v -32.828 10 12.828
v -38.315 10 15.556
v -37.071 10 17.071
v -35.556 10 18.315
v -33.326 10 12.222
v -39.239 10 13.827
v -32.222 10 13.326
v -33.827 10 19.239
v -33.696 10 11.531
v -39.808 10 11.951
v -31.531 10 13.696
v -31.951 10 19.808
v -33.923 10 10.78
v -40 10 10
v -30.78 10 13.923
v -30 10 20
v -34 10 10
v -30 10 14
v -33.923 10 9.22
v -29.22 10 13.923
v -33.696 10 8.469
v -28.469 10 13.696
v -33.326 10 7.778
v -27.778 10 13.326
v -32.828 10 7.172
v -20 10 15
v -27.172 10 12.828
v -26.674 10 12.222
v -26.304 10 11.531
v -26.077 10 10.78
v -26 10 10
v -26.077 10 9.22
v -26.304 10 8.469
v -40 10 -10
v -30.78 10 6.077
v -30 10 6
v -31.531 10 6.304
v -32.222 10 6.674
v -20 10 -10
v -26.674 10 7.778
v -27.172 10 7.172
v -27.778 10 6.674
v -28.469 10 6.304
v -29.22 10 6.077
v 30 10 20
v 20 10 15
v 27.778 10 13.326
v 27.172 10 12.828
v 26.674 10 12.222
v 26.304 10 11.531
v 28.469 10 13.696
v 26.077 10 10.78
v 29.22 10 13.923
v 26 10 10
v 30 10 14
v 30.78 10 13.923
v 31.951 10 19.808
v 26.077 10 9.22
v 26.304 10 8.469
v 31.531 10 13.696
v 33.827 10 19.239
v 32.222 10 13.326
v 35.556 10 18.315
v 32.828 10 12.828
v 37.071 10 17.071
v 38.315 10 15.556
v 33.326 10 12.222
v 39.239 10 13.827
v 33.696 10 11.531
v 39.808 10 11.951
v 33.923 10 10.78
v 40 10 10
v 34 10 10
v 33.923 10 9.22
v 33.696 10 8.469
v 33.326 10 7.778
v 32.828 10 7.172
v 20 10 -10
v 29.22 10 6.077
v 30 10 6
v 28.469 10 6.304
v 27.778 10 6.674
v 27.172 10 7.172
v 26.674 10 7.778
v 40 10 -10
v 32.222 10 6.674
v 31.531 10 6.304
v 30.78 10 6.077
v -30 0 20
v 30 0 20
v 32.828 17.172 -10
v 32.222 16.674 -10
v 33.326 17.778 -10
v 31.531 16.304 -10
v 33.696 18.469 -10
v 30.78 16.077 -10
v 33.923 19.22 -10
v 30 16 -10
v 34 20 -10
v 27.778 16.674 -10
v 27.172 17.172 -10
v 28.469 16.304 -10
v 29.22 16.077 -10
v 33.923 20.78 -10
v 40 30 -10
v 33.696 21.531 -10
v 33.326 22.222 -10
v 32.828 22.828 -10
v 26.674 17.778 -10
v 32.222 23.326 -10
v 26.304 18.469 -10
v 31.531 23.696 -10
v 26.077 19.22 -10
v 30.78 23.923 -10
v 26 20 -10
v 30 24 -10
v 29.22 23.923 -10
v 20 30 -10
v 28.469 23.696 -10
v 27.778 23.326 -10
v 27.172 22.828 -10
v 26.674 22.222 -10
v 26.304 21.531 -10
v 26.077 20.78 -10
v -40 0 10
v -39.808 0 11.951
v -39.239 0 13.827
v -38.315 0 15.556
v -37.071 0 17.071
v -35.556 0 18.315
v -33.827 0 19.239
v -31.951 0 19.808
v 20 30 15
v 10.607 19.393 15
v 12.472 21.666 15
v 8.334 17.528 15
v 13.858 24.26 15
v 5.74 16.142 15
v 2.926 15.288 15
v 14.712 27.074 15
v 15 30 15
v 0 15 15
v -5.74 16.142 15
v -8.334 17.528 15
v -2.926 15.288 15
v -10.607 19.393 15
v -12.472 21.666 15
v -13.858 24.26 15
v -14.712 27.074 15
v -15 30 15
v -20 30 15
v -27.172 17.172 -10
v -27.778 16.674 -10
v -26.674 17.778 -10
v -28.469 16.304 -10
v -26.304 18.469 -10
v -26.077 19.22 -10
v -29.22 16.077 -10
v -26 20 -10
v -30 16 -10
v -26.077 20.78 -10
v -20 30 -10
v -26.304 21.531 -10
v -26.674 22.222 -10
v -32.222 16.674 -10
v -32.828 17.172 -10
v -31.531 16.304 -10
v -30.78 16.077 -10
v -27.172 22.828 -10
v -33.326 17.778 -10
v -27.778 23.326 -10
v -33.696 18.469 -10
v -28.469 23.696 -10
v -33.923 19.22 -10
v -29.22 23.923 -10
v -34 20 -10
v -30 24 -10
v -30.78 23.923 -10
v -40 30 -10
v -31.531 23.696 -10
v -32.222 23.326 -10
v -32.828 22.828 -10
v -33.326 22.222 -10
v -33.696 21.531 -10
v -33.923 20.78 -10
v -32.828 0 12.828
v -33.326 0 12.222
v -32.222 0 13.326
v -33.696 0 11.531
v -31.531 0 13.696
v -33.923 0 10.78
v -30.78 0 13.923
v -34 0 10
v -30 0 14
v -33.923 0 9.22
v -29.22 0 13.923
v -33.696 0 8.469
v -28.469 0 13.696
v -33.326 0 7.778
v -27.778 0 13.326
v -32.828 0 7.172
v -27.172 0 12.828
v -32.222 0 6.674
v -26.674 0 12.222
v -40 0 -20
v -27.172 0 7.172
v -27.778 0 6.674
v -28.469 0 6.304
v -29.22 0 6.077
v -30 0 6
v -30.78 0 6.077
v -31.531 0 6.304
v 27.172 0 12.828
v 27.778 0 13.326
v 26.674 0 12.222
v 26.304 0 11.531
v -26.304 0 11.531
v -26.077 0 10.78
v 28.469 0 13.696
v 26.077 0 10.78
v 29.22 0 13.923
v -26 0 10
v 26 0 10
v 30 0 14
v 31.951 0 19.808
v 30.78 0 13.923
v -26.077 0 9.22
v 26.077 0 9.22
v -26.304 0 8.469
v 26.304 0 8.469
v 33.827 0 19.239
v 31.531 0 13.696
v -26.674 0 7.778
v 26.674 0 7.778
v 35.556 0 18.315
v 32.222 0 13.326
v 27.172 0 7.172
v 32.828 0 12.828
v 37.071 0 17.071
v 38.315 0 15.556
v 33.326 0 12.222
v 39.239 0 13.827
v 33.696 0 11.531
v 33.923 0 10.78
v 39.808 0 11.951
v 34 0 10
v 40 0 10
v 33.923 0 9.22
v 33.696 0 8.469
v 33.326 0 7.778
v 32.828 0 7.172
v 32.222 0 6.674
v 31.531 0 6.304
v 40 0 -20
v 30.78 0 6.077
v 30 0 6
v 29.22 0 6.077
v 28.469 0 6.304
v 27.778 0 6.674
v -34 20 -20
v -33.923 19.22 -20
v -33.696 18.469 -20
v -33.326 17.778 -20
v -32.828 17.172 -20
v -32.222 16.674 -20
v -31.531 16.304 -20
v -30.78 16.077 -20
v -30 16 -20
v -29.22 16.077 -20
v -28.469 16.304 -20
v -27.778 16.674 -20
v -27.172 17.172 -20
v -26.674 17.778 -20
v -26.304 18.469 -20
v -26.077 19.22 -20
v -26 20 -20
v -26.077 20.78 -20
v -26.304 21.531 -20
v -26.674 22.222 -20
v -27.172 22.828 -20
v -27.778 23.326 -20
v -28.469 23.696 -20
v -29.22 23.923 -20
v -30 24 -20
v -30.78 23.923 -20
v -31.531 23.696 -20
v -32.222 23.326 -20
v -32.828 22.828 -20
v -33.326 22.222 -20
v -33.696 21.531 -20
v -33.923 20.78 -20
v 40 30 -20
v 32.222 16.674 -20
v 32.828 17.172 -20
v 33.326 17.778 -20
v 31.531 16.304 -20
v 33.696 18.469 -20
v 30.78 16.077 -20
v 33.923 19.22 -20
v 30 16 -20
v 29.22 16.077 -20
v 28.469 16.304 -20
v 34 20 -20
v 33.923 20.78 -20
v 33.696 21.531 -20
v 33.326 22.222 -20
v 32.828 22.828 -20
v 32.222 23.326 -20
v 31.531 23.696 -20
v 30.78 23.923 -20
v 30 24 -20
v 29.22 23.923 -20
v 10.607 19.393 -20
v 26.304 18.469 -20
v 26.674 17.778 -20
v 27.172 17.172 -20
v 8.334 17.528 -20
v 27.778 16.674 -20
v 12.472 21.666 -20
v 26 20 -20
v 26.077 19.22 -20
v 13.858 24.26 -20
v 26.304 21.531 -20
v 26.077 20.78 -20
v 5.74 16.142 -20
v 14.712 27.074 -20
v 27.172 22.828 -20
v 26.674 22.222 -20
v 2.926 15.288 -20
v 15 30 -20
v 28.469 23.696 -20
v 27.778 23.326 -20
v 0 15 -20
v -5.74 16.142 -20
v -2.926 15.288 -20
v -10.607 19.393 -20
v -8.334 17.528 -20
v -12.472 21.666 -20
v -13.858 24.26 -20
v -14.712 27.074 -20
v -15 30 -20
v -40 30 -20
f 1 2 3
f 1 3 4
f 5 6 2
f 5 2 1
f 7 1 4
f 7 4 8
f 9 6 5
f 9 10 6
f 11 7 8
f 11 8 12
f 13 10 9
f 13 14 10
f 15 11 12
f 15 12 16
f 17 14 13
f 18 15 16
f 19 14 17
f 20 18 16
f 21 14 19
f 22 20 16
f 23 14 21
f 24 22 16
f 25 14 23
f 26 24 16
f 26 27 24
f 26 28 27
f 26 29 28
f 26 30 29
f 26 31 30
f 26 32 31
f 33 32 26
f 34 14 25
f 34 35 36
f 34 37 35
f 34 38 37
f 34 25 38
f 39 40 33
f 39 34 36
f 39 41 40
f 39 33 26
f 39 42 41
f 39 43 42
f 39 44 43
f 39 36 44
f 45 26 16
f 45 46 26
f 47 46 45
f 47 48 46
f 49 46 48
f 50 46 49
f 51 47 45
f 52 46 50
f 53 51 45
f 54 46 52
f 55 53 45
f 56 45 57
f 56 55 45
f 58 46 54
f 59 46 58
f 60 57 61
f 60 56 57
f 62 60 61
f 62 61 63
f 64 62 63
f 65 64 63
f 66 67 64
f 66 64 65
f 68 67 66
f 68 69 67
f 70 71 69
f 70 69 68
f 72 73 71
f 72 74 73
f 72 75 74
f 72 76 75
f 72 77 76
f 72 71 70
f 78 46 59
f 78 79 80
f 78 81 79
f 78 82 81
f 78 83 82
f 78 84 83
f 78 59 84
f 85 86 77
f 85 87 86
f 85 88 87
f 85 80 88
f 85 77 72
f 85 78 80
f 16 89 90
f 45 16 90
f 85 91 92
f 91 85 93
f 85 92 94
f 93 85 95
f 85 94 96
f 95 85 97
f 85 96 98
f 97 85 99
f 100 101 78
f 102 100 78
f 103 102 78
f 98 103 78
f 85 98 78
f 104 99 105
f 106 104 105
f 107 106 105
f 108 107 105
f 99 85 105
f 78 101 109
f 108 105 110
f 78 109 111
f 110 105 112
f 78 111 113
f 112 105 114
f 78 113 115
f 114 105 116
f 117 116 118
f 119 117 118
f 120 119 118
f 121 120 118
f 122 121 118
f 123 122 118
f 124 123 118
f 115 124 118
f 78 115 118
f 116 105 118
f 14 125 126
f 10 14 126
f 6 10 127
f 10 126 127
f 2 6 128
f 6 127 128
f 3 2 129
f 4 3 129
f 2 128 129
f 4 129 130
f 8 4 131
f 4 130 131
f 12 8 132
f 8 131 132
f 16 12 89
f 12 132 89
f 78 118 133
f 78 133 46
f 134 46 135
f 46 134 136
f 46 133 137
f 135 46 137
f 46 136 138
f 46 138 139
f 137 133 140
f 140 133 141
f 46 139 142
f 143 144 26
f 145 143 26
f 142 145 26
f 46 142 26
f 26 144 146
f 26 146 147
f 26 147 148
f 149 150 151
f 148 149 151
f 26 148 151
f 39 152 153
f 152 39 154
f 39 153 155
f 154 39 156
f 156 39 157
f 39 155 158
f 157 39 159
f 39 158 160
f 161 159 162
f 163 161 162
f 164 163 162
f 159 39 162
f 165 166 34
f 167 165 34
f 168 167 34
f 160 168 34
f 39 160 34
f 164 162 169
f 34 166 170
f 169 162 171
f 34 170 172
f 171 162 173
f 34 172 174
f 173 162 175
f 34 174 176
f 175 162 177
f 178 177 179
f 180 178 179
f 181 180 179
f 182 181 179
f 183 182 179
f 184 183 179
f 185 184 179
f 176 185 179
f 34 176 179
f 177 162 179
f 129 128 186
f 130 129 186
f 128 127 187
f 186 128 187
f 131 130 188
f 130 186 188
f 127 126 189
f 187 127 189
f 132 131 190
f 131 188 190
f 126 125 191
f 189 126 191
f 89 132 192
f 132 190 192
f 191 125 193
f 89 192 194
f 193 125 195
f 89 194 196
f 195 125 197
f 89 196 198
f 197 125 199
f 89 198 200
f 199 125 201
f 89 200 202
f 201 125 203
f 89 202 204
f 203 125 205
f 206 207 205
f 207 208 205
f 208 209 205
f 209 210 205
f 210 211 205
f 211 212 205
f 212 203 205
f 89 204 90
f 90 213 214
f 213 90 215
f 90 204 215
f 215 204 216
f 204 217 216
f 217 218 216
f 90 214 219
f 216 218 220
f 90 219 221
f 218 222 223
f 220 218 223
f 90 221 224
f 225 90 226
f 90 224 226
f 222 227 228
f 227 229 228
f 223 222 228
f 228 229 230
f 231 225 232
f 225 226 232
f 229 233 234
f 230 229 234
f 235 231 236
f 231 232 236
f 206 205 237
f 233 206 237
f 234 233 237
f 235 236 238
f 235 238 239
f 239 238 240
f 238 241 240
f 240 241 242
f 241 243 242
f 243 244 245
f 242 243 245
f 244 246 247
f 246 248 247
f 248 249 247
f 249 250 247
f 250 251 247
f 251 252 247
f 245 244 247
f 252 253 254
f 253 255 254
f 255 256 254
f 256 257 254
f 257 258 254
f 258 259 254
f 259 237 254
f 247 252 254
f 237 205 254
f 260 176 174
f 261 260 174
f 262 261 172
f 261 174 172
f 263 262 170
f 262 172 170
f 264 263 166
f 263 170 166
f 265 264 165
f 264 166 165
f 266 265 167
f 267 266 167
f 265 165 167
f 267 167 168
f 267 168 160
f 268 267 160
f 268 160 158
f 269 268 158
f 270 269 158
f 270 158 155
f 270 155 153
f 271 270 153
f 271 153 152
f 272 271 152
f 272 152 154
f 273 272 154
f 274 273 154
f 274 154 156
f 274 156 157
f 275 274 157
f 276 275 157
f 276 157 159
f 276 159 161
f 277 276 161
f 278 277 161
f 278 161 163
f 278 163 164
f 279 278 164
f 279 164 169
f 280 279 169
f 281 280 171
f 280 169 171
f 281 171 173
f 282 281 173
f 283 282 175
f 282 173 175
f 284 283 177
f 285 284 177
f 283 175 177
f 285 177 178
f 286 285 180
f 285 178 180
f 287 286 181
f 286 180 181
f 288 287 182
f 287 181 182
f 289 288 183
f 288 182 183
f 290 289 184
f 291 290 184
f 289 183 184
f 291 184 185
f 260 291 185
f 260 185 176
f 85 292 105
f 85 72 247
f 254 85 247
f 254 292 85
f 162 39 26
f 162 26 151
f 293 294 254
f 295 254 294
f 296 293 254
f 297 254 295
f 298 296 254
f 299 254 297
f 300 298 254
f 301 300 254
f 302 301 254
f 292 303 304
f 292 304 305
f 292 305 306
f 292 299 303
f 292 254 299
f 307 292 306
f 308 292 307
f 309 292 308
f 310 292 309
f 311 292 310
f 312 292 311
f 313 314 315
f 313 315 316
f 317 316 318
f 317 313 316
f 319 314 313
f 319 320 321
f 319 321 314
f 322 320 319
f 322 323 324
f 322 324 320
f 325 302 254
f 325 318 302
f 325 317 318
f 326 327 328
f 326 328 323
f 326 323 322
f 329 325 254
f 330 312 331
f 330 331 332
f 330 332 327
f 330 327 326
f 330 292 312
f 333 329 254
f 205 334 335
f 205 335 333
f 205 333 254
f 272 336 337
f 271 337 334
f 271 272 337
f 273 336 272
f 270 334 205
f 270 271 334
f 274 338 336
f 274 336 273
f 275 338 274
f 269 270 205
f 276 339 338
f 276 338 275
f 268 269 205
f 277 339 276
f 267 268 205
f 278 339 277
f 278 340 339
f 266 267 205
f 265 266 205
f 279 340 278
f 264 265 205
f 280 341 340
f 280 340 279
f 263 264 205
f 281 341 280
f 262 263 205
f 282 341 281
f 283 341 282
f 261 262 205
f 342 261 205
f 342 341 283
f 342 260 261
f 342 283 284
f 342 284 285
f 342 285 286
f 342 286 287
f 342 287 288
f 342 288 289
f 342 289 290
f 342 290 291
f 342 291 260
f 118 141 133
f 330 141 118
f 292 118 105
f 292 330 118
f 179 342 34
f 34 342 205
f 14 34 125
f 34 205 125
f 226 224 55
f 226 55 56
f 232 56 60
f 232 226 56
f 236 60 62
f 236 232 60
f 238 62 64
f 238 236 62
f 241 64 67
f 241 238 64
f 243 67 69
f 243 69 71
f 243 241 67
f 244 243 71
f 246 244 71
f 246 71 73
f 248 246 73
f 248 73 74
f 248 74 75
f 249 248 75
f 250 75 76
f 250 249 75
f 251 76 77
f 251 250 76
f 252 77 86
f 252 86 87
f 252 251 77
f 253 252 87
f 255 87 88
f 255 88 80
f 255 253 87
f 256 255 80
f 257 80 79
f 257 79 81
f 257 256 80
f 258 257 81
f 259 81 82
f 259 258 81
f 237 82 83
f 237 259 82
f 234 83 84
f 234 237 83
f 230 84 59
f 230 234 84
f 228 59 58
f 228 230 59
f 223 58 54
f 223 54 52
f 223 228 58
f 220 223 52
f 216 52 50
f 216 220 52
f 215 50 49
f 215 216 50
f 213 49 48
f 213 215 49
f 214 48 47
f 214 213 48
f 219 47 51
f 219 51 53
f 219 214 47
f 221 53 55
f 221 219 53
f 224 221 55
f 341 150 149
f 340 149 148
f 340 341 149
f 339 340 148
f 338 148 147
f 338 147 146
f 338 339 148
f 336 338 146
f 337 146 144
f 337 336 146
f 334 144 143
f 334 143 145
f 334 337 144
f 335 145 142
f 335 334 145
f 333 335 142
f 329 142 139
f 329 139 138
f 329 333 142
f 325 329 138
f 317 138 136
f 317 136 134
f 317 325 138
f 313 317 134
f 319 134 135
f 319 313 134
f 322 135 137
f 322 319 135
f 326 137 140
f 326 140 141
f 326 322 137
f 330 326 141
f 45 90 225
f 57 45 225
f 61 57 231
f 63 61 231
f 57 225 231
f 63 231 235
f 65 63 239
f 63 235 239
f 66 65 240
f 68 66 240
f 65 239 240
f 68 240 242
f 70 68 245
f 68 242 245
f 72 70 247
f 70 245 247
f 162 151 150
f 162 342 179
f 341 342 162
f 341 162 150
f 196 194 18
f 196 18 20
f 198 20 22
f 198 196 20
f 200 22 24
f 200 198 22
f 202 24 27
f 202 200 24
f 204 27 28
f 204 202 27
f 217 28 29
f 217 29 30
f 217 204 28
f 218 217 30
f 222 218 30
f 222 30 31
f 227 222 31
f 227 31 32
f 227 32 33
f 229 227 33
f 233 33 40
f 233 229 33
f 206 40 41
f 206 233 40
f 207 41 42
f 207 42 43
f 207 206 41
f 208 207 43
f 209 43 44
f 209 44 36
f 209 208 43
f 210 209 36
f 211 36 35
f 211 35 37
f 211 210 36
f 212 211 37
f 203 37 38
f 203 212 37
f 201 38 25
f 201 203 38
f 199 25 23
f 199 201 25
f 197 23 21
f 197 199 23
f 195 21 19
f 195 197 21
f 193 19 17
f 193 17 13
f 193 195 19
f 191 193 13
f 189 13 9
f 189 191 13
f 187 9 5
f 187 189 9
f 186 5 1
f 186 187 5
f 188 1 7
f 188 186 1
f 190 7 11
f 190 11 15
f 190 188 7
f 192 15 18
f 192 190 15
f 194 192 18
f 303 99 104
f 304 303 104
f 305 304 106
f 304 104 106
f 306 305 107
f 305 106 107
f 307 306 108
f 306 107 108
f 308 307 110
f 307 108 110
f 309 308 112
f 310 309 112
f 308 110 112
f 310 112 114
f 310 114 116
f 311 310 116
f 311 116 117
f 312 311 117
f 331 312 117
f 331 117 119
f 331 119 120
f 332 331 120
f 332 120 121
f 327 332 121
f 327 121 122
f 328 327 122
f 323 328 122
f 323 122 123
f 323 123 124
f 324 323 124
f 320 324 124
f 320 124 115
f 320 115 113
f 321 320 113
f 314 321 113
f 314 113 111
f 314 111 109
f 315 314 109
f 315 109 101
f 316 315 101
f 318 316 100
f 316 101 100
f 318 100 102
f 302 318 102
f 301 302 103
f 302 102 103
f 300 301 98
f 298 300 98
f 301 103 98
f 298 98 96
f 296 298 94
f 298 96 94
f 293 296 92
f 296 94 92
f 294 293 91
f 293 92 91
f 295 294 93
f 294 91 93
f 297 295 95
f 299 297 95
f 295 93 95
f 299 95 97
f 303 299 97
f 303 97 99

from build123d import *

# Parameters (mm, degrees)
SKETCH1_R           = 4
BOSS_EXTRUDE1_DEPTH = 10
BOSS_EXTRUDE2_DEPTH = 10
BOSS_EXTRUDE3_DEPTH = 35
SKETCH3_R           = 4
CUT_EXTRUDE1_DEPTH  = 59.309518948


with BuildPart() as part:
    # Sketch1 → Boss-Extrude1 (new body)
    with BuildSketch(Plane(origin=(0, 0, 0), x_dir=(1, 0, 0), z_dir=(0, 1, 0))):
        with BuildLine():
            Line((-30, -20), (30, -20))
            ThreePointArc((30, -20), (37.071067812, -17.071067812), (40, -10))
            Line((40, -10), (40, 20))
            Line((40, 20), (-40, 20))
            Line((-40, 20), (-40, -10))
            ThreePointArc((-40, -10), (-37.071067812, -17.071067812), (-30, -20))
        make_face()
        with Locations((-30, -10)):
            Circle(SKETCH1_R, mode=Mode.SUBTRACT)
        with Locations((30, -10)):
            Circle(SKETCH1_R, mode=Mode.SUBTRACT)
    extrude(amount=BOSS_EXTRUDE1_DEPTH)

    # Sketch2 → Boss-Extrude2 (add)
    with BuildSketch(Plane(origin=(0, 0, -20), x_dir=(-1, 0, 0), z_dir=(0, 0, -1))):
        Polygon((40, 0), (40, 30), (20, 30), (20, 10), (-20, 10), (-20, 30), (-40, 30), (-40, 0), align=None)
    extrude(amount=-BOSS_EXTRUDE2_DEPTH)

    # Sketch2<3> → Boss-Extrude3 (add)
    with BuildSketch(Plane(origin=(0, 0, -20), x_dir=(-1, 0, 0), z_dir=(0, 0, -1))):
        with BuildLine():
            Line((-20, 10), (20, 10))
            Line((20, 10), (20, 30))
            Line((20, 30), (15, 30))
            ThreePointArc((15, 30), (0, 15), (-15, 30))
            Line((-15, 30), (-20, 30))
            Line((-20, 30), (-20, 10))
        make_face()
    extrude(amount=-BOSS_EXTRUDE3_DEPTH)

    # Sketch3 → Cut-Extrude1 (cut, through all)
    with BuildSketch(Plane.XY.offset(-10)):
        with Locations((30, 20)):
            Circle(SKETCH3_R)
        with Locations((-30, 20)):
            Circle(SKETCH3_R)
    extrude(amount=-CUT_EXTRUDE1_DEPTH, mode=Mode.SUBTRACT)


solid = part.part
